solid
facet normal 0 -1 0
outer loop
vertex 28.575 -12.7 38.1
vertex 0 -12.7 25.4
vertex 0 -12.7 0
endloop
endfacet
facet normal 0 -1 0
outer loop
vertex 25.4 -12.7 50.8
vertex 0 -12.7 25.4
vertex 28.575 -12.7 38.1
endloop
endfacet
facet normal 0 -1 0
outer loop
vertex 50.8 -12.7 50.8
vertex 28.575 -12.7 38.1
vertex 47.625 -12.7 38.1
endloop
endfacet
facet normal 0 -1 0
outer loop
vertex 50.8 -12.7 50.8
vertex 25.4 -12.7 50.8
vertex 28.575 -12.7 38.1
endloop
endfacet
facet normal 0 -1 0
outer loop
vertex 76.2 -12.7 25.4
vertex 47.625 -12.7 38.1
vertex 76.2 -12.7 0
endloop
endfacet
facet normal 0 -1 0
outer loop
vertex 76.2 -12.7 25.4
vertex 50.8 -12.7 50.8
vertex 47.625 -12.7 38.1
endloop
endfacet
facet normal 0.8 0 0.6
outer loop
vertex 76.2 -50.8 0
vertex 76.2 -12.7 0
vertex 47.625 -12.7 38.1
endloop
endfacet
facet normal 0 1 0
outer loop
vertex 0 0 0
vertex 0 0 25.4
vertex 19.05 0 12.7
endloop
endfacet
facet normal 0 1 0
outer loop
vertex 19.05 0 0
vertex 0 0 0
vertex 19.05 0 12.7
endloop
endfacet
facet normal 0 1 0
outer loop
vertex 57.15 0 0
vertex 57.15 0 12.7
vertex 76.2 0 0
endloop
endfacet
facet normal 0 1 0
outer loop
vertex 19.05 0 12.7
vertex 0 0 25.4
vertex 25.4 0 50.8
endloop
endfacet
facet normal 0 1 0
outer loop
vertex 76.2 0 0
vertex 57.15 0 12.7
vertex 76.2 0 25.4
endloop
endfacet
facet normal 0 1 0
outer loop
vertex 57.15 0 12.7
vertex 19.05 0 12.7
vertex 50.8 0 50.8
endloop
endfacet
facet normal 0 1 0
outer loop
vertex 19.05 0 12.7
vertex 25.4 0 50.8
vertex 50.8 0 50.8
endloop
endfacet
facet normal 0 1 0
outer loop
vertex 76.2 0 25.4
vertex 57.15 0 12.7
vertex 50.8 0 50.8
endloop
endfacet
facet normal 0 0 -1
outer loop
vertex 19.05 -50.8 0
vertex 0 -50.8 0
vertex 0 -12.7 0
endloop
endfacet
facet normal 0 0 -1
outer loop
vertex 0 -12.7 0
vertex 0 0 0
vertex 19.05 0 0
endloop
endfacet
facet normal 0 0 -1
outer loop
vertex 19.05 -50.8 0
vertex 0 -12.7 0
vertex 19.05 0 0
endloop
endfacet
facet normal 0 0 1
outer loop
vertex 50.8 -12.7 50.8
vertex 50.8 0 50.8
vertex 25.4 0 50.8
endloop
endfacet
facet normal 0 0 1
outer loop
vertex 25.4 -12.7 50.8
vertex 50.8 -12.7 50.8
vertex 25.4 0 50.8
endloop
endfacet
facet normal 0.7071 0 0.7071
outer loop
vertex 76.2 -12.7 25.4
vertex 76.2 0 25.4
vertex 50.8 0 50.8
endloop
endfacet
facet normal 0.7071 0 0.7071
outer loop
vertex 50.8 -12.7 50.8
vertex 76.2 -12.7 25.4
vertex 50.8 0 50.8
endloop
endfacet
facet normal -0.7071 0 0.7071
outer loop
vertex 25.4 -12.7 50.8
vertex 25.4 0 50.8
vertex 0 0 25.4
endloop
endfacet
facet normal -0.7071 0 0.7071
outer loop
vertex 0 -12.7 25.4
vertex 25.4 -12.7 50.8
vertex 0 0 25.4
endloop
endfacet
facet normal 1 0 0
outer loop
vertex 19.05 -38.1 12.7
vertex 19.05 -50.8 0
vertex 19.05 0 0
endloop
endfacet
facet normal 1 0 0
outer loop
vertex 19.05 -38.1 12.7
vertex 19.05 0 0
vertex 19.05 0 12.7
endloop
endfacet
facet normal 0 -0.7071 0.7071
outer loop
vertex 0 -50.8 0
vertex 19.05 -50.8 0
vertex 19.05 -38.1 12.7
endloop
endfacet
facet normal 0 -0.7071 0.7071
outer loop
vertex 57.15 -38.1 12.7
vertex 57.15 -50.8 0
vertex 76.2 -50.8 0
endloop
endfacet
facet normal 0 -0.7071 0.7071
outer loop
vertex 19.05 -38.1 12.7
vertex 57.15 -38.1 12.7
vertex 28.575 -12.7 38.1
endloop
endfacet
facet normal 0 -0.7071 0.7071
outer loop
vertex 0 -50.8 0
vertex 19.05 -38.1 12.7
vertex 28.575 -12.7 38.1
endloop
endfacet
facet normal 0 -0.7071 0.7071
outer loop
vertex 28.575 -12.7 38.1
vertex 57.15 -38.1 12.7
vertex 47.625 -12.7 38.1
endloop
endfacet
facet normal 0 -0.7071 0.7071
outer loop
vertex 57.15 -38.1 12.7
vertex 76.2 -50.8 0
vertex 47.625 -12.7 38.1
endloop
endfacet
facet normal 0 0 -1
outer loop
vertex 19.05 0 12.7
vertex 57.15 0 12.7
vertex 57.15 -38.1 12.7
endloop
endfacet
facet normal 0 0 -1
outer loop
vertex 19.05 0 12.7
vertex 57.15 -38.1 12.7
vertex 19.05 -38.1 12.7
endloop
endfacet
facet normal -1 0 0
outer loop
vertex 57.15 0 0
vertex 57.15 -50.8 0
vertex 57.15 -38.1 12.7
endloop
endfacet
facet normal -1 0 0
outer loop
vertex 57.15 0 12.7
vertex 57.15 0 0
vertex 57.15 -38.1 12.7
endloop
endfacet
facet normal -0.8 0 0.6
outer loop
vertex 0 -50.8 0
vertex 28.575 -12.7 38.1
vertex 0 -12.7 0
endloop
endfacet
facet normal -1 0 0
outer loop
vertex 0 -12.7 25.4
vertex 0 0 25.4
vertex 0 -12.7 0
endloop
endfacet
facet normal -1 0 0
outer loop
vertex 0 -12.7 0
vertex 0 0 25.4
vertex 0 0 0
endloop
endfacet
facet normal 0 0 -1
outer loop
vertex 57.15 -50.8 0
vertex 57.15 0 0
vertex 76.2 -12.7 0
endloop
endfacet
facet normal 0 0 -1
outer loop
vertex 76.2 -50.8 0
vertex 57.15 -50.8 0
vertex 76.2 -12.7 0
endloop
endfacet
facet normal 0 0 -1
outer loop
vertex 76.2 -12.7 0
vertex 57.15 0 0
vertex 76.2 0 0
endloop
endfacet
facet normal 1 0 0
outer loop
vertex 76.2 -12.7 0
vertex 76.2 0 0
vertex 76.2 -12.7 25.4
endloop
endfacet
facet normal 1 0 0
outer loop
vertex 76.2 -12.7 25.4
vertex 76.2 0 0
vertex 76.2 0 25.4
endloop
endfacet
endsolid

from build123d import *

# Parameters (mm, degrees)
F1_DEPTH = 12.7
F3_DEPTH = 38.1
F4_W     = 38.1
F4_H     = 12.7
F5_DEPTH = 50.801
F7_DEPTH = 76.201


with BuildPart() as f1:
    # F0 (on Front) → F1 (new body)
    with BuildSketch(Plane.XZ):
        Polygon((0, 25.4), (0, 0), (76.2, 0), (76.2, 25.4), (50.8, 50.8), (25.4, 50.8), align=None)
    extrude(amount=F1_DEPTH)

    # F2 (on face) → F3 (join)
    with BuildSketch(Plane.XZ.offset(12.7)):
        Polygon((38.1, 50.8), (0, 0), (76.2, 0), align=None)
    extrude(amount=F3_DEPTH)

    # F4 (on face) → F5 (cut, through all)
    with BuildSketch(Plane(origin=(0, 0, 0), x_dir=(-1, 0, 0), z_dir=(0, 1, 0))):
        with Locations((-38.1, 6.35)):
            Rectangle(F4_W, F4_H)
    extrude(amount=-F5_DEPTH, mode=Mode.SUBTRACT)

    # F6 (on face) → F7 (cut, through all)
    with BuildSketch(Plane.YZ.offset(76.2)):
        Polygon((-12.7, 38.1), (-12.7, 50.8), (-50.8, 50.8), (-50.8, 0), align=None)
    extrude(amount=-F7_DEPTH, mode=Mode.SUBTRACT)


solid = f1.part
